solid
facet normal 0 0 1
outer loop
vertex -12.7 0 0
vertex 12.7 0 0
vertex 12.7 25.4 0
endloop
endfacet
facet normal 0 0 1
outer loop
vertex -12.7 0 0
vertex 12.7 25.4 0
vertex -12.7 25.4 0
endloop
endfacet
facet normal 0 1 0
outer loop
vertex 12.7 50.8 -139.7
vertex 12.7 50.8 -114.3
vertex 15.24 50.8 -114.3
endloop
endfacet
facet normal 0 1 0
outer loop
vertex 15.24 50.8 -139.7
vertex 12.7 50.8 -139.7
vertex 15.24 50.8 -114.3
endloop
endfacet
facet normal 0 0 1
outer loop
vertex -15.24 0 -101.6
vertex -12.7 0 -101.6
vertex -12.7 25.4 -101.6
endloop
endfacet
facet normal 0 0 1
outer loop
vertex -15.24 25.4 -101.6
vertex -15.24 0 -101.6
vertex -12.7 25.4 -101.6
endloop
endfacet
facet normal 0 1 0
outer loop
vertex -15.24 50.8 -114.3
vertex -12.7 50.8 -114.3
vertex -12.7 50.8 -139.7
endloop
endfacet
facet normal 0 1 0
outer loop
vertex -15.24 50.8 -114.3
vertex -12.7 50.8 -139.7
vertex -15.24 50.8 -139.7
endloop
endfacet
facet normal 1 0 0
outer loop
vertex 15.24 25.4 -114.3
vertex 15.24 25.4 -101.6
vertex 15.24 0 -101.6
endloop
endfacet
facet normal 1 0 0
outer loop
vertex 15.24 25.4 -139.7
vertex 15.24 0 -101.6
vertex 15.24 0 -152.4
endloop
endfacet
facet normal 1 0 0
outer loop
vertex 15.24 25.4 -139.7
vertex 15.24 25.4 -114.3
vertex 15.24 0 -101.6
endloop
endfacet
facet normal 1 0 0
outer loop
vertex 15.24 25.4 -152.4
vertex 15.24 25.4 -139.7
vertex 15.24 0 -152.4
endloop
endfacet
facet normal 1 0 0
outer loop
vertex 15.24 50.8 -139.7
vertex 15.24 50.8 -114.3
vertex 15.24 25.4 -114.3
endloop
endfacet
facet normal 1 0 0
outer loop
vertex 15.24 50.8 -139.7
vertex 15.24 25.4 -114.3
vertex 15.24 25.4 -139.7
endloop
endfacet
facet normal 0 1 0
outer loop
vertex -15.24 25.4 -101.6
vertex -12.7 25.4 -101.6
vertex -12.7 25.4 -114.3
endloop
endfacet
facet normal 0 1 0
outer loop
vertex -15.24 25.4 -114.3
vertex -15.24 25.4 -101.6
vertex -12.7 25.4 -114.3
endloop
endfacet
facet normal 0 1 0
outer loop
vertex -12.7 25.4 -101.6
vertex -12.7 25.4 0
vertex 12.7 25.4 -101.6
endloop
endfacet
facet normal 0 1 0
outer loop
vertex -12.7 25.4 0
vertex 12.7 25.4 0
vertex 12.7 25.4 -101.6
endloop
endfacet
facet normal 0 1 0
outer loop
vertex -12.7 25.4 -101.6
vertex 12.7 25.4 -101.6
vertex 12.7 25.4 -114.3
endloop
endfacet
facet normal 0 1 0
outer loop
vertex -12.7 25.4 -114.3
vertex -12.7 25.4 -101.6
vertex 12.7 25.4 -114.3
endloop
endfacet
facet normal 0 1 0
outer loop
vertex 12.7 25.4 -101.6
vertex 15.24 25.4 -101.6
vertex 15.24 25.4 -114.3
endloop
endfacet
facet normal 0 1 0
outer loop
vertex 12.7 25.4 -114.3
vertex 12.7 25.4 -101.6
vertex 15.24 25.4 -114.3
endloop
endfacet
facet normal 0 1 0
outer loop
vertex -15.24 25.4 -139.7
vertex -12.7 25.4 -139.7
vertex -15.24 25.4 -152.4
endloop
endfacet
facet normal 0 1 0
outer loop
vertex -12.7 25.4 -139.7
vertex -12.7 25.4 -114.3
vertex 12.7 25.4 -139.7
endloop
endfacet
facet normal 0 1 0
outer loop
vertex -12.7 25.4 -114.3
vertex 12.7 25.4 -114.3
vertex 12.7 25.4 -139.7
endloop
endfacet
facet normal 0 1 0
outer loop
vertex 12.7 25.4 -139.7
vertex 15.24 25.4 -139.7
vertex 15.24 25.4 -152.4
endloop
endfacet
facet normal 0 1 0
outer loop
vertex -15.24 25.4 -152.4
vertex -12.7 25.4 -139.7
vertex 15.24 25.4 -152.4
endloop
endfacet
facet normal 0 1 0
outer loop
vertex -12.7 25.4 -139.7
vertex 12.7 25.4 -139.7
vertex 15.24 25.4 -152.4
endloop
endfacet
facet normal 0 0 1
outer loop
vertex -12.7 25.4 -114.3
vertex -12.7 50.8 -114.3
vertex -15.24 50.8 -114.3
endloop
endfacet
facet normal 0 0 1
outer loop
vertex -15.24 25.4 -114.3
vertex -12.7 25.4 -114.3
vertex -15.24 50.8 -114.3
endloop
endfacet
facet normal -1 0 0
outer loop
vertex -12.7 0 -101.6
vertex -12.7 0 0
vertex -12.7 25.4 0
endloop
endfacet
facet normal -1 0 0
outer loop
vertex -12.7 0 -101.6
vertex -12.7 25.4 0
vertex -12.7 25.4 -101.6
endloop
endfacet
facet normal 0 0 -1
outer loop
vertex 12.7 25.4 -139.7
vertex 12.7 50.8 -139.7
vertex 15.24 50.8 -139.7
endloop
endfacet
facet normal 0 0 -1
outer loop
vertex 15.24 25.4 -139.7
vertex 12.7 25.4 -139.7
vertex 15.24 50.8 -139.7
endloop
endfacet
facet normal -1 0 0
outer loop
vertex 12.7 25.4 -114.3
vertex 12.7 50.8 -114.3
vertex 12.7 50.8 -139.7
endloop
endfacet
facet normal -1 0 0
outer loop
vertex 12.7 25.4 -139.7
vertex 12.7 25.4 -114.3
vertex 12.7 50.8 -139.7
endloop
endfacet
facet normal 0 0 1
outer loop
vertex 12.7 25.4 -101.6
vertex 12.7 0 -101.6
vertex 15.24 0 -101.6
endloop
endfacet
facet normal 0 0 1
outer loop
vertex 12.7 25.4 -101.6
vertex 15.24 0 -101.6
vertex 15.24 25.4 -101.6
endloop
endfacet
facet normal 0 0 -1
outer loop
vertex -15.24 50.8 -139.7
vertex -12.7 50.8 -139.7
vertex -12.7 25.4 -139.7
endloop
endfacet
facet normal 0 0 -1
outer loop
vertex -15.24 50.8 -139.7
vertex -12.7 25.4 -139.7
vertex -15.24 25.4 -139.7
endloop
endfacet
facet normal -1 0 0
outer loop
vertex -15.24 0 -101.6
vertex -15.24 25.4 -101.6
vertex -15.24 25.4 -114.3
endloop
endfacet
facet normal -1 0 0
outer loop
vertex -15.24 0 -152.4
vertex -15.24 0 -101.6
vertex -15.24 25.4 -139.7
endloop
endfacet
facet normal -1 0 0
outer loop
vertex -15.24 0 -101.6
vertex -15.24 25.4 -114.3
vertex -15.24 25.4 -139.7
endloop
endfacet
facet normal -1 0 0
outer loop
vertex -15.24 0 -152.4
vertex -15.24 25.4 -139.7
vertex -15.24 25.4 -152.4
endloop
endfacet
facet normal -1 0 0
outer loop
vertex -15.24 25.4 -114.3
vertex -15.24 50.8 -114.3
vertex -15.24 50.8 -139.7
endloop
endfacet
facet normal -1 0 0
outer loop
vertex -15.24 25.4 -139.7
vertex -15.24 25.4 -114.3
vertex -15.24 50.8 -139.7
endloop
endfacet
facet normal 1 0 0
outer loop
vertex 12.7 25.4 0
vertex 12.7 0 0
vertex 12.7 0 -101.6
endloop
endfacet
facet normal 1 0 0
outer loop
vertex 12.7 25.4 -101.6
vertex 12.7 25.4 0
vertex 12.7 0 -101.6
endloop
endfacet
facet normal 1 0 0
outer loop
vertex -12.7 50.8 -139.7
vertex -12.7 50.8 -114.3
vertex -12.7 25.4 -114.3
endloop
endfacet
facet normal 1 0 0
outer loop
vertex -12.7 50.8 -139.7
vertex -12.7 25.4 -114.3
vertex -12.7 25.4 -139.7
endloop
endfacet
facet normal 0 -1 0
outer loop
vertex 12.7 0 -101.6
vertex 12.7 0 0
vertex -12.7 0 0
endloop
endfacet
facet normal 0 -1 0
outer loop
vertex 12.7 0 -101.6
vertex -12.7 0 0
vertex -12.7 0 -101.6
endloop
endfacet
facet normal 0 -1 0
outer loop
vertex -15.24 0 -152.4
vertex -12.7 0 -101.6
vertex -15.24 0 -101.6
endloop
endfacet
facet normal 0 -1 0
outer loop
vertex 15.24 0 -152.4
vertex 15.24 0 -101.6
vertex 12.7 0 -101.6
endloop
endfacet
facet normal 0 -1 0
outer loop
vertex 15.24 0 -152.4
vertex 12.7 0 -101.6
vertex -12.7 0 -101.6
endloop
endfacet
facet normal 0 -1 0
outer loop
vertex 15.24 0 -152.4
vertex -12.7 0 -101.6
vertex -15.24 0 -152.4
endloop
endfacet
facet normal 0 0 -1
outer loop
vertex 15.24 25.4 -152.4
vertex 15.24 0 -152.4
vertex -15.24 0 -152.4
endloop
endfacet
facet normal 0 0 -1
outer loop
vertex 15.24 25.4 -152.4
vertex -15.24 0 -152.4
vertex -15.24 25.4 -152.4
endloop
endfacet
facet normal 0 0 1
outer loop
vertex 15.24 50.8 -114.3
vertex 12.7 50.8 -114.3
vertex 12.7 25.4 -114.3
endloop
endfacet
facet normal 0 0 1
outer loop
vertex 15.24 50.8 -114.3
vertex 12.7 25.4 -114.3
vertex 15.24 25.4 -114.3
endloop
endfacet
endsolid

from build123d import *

# Parameters (mm, degrees)
SKETCH1_W           = 12.7
SKETCH1_H           = 152.4
BOSS_EXTRUDE1_DEPTH = 25.4
SKETCH6_W           = 50.8
SKETCH6_H           = 25.4
BOSS_EXTRUDE5_DEPTH = 2.54
SKETCH7_W           = 2.54
SKETCH7_H           = 25.4
BOSS_EXTRUDE6_DEPTH = 25.4


with BuildPart() as part:
    # Sketch1 → Boss-Extrude1 (new body)
    with BuildSketch(Plane(origin=(0, 0, 0), x_dir=(1, 0, 0), z_dir=(0, 1, 0))):
        with Locations((6.35, 76.2)):
            Rectangle(SKETCH1_W, SKETCH1_H)
    boss_extrude1 = extrude(amount=BOSS_EXTRUDE1_DEPTH)

    # Sketch6 → Boss-Extrude5 (add)
    with BuildSketch(Plane(origin=(12.7, 0, 0), x_dir=(0, 0, -1), z_dir=(1, 0, 0))):
        with Locations((127, 12.7)):
            Rectangle(SKETCH6_W, SKETCH6_H)
    boss_extrude5 = extrude(amount=BOSS_EXTRUDE5_DEPTH)

    # Sketch7 → Boss-Extrude6 (add)
    with BuildSketch(Plane(origin=(0, 25.4, 0), x_dir=(1, 0, 0), z_dir=(0, 1, 0))):
        with Locations((13.97, 127)):
            Rectangle(SKETCH7_W, SKETCH7_H)
    boss_extrude6 = extrude(amount=BOSS_EXTRUDE6_DEPTH)

    # Mirror1: Boss-Extrude1, Boss-Extrude5, Boss-Extrude6 across plane
    add(boss_extrude1.mirror(Plane(origin=(0, 25.4, 0), x_dir=(0, 0, 1), z_dir=(1, 0, 0))))
    add(boss_extrude5.mirror(Plane(origin=(0, 25.4, 0), x_dir=(0, 0, 1), z_dir=(1, 0, 0))))
    add(boss_extrude6.mirror(Plane(origin=(0, 25.4, 0), x_dir=(0, 0, 1), z_dir=(1, 0, 0))))


solid = part.part
